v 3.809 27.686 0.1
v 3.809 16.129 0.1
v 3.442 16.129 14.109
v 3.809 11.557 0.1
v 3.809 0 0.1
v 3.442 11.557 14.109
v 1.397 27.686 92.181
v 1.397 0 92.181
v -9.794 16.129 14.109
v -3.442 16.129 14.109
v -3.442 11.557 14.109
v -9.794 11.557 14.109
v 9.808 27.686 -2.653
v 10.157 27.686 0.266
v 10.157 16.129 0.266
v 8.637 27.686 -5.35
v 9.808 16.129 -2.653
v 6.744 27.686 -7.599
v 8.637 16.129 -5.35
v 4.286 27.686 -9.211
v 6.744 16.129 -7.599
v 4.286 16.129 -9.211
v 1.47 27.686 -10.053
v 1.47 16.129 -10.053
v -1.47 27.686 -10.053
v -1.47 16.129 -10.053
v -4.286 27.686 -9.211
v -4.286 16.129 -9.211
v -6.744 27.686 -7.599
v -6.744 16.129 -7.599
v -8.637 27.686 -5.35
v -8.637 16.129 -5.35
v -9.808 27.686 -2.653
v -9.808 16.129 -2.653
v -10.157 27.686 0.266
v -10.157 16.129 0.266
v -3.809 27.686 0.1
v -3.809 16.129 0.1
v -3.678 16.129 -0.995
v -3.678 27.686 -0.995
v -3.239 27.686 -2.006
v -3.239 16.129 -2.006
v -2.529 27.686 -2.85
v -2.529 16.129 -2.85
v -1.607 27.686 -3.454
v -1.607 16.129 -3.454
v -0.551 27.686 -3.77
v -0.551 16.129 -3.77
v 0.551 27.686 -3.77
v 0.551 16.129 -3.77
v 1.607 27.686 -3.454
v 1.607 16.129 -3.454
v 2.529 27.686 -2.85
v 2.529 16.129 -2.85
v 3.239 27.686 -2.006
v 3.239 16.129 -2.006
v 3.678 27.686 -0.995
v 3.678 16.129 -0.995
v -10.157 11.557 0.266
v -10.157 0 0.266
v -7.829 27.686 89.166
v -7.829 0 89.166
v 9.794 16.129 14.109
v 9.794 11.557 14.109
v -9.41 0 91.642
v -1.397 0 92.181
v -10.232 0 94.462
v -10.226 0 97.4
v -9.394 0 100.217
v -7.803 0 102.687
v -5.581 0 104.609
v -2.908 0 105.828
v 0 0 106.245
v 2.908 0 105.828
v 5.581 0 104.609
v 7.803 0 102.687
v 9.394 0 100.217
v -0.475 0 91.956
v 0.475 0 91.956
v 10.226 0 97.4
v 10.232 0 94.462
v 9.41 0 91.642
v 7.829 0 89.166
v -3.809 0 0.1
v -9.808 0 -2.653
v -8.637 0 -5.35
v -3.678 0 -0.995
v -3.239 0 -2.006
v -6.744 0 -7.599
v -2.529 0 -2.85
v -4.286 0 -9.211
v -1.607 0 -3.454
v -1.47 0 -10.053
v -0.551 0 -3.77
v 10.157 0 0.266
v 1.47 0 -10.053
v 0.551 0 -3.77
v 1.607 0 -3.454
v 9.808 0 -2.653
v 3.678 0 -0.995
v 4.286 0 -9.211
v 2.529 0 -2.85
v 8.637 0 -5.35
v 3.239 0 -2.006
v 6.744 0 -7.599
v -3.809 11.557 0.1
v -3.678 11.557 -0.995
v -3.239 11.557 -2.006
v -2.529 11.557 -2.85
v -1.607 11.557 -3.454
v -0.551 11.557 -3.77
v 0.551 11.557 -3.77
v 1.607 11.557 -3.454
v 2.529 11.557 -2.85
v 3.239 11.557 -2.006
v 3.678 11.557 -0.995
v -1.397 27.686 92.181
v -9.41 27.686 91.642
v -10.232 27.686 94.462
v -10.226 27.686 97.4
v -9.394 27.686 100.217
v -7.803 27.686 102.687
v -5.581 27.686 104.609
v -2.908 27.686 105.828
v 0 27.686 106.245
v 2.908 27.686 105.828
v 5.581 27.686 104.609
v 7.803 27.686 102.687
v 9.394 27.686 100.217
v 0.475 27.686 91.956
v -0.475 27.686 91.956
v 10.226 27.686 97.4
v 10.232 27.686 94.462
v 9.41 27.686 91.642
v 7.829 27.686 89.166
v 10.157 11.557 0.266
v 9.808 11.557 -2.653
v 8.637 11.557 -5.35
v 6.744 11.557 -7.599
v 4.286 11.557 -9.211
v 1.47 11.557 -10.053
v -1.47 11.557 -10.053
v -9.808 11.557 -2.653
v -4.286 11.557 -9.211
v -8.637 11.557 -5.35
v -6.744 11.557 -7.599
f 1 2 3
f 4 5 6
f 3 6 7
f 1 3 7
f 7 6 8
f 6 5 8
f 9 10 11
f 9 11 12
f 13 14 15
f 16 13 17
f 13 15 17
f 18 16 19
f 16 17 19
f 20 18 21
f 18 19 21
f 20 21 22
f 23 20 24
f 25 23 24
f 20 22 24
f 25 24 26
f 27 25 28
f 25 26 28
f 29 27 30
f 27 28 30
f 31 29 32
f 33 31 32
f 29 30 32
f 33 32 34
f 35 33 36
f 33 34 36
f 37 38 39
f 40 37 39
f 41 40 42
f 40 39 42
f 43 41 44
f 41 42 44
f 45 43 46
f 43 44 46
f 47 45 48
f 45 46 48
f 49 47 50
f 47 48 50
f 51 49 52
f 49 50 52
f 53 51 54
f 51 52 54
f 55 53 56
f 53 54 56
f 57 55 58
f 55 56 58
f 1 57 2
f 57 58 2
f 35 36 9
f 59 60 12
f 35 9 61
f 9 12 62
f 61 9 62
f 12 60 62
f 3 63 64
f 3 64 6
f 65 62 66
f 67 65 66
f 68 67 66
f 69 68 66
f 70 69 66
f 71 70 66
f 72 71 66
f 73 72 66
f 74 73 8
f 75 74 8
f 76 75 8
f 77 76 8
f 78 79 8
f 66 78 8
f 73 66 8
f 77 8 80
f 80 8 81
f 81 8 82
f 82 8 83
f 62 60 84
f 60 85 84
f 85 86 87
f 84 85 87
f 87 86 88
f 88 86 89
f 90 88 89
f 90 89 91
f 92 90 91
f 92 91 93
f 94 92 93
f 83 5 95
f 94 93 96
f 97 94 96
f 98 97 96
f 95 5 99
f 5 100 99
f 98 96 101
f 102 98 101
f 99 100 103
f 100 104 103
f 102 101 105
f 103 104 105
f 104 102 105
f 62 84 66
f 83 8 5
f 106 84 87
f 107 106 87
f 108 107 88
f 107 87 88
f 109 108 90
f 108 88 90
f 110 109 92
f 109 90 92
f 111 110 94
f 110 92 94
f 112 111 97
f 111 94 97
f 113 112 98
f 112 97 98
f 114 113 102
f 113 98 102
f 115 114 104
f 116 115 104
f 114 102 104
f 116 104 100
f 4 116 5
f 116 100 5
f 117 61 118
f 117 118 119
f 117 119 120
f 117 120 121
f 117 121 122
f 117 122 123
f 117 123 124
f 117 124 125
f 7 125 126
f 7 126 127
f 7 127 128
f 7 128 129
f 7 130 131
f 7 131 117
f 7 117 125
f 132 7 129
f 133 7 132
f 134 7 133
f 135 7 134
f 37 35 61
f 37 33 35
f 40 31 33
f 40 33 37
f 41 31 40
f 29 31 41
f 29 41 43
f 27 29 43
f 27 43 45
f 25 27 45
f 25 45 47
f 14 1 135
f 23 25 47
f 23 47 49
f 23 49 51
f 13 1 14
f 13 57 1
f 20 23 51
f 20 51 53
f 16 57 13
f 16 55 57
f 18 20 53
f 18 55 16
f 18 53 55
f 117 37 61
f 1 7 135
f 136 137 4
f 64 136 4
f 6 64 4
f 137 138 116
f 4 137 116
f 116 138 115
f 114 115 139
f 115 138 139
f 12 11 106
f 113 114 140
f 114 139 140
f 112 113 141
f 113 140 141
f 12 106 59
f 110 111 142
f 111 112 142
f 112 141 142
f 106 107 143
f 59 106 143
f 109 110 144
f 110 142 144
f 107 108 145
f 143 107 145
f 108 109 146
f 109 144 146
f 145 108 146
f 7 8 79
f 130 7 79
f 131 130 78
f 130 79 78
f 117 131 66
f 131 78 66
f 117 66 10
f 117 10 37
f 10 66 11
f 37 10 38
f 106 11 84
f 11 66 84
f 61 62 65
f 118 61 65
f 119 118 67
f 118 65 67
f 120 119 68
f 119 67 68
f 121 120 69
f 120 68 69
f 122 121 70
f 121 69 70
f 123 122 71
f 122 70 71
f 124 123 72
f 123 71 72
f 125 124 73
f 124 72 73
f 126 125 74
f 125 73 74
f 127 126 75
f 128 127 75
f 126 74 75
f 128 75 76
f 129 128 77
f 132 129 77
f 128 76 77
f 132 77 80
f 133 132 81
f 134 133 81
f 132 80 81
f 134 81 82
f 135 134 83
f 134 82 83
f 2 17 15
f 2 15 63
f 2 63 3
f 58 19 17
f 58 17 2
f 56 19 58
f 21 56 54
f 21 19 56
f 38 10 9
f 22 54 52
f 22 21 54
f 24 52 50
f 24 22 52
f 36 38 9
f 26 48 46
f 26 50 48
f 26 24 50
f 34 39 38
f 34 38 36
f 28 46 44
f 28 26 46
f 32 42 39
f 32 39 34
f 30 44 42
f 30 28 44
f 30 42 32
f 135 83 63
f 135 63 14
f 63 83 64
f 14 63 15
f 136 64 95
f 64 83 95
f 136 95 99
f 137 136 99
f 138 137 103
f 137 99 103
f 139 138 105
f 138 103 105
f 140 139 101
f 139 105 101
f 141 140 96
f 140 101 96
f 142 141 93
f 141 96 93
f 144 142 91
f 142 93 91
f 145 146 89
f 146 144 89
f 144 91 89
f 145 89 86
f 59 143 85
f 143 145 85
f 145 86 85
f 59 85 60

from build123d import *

# Parameters (mm, degrees)
BOSS_EXTRUDE1_DEPTH = 27.686
SKETCH2_W           = 29.921903197
SKETCH2_H           = 4.572
CUT_EXTRUDE1_DEPTH  = 13.843
SKETCH3_OUTSIDE_W   = 46.952
SKETCH3_OUTSIDE_H   = 142.689
CUT_EXTRUDE2_DEPTH  = 27.686


with BuildPart() as part:
    # Sketch1 → Boss-Extrude1 (new body)
    with BuildSketch(Plane(origin=(0, 0, 0), x_dir=(1, 0, 0), z_dir=(0, 1, 0))):
        with BuildLine():
            Line((-10.156518422, -0.265957795), (-7.828589994, -89.165957795))
            ThreePointArc((-7.828589994, -89.165957795), (0, -106.245464925), (7.828589994, -89.165957795))
            Line((7.828589994, -89.165957795), (10.156518422, -0.265957795))
            ThreePointArc((10.156518422, -0.265957795), (0, 10.16), (-10.156518422, -0.265957795))
        make_face()
    extrude(amount=BOSS_EXTRUDE1_DEPTH)

    # Sketch2 → Cut-Extrude1 (cut, symmetric)
    with BuildSketch(Plane(origin=(0, 0, 0.265957795), x_dir=(-1, 0, 0), z_dir=(0, 0, -1))):
        with Locations((1.107435291, 13.843)):
            Rectangle(SKETCH2_W, SKETCH2_H)
    extrude(amount=CUT_EXTRUDE1_DEPTH, both=True, mode=Mode.SUBTRACT)

    # Sketch3 outside → Cut-Extrude2 (cut)
    with BuildSketch(Plane.XZ):
        with Locations((0, 48.0425)):
            Rectangle(SKETCH3_OUTSIDE_W, SKETCH3_OUTSIDE_H)
        with BuildLine():
            Line((10.156518422, 0.265957795), (7.828589994, 89.165957795))
            ThreePointArc((7.828589994, 89.165957795), (0, 106.245464925), (-7.828589994, 89.165957795))
            Line((-7.828589994, 89.165957795), (-10.156518422, 0.265957795))
            ThreePointArc((-10.156518422, 0.265957795), (0, -10.16), (10.156518422, 0.265957795))
        make_face(mode=Mode.SUBTRACT)
        with BuildLine():
            Line((-1.397467487, 92.180775304), (-3.808694408, 0.099734173))
            ThreePointArc((-3.808694408, 0.099734173), (0, -3.81), (3.808694408, 0.099734173))
            Line((3.808694408, 0.099734173), (1.397467487, 92.180775304))
            ThreePointArc((1.397467487, 92.180775304), (0, 91.927632861), (-1.397467487, 92.180775304))
        make_face()
    extrude(amount=-CUT_EXTRUDE2_DEPTH, mode=Mode.SUBTRACT)


solid = part.part
